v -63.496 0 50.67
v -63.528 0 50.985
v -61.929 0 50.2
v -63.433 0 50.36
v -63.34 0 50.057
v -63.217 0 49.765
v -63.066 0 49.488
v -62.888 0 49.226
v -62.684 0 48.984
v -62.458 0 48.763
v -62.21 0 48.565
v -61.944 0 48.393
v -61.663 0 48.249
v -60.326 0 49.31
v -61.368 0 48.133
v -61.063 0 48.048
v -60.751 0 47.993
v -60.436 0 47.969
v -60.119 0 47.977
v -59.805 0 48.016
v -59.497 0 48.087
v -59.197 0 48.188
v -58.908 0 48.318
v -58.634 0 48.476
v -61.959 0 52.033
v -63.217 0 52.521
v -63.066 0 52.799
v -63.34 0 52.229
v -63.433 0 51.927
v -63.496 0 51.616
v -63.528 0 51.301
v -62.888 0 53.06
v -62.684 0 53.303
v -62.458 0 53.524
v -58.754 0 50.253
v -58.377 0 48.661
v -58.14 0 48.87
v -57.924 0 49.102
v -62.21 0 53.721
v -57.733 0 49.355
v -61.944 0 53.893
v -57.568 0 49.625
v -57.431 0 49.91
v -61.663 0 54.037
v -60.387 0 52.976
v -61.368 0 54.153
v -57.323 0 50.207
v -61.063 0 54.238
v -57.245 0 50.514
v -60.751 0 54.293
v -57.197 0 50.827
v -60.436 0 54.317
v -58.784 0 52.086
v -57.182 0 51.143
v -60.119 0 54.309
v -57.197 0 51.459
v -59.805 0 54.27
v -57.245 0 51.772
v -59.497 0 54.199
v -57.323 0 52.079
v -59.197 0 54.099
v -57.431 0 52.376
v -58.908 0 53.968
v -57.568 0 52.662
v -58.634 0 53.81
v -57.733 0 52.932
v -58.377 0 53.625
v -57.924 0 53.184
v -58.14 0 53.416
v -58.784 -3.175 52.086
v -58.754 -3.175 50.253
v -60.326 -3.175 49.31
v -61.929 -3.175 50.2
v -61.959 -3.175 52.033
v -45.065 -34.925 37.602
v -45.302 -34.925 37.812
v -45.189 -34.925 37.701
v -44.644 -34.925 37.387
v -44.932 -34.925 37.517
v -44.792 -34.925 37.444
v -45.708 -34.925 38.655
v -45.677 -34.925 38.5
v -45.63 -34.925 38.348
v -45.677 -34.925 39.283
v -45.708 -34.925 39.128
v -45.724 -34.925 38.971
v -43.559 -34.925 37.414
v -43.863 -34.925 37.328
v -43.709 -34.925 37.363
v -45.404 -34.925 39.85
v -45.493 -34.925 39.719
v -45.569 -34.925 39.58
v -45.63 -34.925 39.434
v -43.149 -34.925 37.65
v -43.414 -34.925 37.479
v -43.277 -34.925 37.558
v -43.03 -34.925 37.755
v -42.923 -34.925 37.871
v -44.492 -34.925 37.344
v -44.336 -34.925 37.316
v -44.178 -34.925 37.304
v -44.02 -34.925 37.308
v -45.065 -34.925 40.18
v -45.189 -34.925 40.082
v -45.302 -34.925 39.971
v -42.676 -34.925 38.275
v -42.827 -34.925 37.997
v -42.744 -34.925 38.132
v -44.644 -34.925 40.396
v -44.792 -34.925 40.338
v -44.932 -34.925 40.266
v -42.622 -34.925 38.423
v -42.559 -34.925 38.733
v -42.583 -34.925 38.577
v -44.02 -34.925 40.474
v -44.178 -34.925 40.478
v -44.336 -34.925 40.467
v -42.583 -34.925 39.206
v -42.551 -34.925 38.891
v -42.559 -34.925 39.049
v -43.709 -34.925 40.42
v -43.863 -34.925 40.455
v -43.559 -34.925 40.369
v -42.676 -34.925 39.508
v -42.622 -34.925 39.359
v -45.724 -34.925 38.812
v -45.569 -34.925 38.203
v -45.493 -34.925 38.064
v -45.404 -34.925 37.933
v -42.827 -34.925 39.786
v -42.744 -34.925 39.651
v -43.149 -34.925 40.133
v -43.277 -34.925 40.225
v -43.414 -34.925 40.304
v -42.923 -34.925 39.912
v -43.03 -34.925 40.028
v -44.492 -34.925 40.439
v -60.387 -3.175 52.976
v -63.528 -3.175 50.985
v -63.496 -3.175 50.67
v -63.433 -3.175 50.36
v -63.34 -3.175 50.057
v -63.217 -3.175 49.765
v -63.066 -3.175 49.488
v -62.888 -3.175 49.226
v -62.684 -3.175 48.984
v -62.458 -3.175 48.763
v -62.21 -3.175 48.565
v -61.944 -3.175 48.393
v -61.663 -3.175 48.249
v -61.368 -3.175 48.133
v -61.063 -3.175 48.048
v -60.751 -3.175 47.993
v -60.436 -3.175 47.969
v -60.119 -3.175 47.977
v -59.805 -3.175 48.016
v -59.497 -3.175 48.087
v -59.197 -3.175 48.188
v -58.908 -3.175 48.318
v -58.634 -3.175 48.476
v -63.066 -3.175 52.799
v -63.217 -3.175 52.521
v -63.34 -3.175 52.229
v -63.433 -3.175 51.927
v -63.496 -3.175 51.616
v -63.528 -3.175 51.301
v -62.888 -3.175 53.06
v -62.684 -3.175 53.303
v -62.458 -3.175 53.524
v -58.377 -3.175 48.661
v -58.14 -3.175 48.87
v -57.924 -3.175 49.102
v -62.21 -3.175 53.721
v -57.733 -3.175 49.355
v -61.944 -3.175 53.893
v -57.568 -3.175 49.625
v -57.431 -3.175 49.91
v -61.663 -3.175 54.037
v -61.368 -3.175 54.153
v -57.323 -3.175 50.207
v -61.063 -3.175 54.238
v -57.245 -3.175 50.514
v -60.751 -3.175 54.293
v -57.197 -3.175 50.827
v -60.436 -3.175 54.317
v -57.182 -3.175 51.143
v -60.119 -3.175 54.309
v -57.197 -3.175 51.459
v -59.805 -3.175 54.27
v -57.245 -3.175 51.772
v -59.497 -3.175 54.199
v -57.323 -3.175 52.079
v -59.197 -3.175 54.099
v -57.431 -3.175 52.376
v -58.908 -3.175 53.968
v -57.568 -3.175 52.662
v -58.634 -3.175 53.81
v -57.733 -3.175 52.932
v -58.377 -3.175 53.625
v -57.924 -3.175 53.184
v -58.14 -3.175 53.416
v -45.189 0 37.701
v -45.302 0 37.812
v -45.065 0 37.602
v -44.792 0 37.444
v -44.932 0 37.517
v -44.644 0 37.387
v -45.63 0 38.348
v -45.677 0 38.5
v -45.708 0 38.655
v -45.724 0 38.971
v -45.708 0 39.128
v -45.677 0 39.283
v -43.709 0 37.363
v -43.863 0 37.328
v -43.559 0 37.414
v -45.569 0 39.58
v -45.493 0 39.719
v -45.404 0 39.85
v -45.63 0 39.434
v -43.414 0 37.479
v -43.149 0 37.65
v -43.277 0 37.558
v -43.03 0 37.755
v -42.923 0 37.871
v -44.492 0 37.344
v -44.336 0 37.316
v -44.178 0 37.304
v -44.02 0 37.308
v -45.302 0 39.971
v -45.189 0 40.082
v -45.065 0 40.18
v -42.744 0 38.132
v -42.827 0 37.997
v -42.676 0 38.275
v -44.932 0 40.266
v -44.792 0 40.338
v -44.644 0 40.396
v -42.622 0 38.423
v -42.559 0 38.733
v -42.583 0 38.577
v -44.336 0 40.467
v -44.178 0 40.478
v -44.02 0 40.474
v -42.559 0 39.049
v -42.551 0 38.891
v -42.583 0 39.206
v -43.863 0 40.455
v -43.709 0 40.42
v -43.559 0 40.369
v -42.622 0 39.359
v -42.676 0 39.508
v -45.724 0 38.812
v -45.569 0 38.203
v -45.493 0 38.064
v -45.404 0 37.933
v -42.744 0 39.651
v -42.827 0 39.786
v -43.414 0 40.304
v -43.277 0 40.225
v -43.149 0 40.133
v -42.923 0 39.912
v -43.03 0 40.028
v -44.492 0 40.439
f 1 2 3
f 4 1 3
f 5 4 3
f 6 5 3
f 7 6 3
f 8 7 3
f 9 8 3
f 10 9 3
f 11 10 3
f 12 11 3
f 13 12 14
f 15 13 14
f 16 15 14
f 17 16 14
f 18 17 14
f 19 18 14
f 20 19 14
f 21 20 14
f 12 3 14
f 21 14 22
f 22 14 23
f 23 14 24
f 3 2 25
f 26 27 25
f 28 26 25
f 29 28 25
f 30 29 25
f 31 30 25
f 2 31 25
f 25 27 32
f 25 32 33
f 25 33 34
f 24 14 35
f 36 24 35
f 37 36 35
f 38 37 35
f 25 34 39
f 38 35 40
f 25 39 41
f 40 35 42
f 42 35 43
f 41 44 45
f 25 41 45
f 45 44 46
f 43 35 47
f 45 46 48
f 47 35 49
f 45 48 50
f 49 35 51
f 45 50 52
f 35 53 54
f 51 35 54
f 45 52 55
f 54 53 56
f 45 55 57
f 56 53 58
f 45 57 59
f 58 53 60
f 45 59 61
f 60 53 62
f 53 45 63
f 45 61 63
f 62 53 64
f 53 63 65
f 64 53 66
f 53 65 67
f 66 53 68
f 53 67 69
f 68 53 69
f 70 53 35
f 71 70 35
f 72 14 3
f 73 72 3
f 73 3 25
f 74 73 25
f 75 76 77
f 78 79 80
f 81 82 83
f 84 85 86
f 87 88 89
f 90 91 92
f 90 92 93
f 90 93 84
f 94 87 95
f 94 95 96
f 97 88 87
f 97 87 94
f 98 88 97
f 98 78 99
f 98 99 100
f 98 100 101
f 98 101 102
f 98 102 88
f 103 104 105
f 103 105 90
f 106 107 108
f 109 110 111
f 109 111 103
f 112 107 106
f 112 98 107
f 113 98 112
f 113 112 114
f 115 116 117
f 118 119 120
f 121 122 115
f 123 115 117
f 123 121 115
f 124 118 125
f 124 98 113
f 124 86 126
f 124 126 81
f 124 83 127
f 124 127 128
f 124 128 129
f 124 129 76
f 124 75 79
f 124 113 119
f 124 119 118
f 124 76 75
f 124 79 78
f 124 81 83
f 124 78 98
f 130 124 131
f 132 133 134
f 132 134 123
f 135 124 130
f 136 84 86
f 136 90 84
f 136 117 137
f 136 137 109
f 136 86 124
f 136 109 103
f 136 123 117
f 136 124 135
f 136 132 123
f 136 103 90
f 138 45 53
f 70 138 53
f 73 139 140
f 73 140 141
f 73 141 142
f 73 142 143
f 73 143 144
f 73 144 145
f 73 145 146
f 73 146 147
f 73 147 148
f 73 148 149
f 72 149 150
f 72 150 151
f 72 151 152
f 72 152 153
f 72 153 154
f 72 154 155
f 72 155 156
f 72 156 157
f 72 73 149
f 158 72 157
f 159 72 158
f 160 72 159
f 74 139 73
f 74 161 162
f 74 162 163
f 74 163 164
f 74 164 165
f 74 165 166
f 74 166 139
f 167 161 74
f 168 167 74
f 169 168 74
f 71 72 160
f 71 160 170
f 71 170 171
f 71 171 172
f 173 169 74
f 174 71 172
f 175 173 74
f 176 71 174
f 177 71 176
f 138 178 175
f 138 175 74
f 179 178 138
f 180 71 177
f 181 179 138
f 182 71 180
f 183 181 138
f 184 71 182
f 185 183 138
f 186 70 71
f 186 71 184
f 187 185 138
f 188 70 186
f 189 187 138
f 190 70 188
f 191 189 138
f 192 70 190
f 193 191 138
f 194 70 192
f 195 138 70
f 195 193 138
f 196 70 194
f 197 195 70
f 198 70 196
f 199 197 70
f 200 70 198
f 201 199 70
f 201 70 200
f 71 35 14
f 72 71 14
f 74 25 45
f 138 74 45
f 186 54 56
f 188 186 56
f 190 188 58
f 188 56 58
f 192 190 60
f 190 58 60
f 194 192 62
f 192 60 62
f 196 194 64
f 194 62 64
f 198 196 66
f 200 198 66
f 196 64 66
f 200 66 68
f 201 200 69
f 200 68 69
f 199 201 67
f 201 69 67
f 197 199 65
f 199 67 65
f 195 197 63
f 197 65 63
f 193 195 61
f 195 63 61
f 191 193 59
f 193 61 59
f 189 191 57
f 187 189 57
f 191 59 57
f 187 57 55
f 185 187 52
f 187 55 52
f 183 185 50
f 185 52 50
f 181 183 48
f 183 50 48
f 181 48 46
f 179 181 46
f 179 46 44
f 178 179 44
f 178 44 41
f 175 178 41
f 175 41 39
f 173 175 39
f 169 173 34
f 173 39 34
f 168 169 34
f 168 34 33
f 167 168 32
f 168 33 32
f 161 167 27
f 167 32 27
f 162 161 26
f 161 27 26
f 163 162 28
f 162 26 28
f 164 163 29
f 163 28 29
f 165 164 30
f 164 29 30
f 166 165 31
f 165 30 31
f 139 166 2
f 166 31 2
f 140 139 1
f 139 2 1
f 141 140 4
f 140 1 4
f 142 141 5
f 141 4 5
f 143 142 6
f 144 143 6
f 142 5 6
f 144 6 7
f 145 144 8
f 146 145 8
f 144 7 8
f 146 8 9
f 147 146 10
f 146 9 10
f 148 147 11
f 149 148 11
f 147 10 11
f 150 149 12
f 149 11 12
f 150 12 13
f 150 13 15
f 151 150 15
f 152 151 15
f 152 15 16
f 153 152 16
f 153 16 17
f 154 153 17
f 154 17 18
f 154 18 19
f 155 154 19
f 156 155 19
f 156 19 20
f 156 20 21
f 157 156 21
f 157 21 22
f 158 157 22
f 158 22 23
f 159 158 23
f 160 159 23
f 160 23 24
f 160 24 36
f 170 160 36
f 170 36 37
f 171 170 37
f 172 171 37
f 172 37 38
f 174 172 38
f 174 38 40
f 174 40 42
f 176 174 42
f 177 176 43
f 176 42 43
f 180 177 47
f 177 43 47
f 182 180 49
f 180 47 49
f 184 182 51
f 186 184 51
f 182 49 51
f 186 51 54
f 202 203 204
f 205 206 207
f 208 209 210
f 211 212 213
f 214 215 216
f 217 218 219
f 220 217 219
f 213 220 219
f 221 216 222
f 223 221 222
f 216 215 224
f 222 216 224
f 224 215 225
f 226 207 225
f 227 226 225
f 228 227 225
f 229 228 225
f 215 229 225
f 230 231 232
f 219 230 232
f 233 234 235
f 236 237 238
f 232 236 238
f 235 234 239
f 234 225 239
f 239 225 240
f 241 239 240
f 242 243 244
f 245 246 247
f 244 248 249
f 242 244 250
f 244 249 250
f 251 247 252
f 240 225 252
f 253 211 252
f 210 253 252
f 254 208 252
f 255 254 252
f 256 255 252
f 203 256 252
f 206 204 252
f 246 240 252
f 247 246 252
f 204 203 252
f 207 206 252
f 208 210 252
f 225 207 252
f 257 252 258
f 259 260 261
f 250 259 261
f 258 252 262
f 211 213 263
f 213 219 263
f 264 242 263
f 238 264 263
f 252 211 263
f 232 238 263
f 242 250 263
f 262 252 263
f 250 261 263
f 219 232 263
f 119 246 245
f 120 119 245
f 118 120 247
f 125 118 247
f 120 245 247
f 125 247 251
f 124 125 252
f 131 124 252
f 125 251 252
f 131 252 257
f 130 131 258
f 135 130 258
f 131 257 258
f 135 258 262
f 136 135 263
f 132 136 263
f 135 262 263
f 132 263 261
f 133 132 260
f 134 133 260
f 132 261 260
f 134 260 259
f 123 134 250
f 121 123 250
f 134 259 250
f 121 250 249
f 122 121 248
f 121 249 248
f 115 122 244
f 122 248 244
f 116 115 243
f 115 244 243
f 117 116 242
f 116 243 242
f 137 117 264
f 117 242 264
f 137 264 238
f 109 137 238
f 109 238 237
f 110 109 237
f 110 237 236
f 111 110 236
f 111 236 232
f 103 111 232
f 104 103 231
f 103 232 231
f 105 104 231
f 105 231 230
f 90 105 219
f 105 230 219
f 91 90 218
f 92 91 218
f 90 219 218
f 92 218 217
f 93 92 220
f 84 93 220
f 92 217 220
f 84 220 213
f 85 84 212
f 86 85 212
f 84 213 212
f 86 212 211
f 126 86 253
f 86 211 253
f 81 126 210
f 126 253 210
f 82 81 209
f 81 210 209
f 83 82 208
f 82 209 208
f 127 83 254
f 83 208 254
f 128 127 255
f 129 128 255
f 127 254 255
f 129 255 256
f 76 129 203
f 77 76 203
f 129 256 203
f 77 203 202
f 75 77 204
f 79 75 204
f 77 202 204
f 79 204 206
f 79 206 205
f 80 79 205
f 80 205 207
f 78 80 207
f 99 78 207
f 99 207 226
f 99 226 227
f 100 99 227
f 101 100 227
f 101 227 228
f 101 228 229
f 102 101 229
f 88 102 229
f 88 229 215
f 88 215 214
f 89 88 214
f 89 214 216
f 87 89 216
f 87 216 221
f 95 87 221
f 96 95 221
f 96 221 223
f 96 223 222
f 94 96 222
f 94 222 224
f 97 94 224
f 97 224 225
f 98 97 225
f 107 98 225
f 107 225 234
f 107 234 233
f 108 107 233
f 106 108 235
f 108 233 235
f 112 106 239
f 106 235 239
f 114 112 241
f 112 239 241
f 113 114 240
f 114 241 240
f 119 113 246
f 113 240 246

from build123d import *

# Parameters (mm, degrees)
F0_R     = 3.175
F1_DEPTH = 3.175
F2_R     = 1.5875
F3_DEPTH = 34.925


with BuildPart() as f1:
    # F0 (on Front) → F1 (new body)
    with BuildSketch(Plane.XZ):
        with Locations((-60.356679, 51.143057)):
            Circle(F0_R)
        Polygon((-61.959338, 52.033345), (-60.386997, 52.976144), (-58.784338, 52.085857), (-58.75402, 50.25277), (-60.326361, 49.30997), (-61.92902, 50.200258), align=None, mode=Mode.SUBTRACT)
    extrude(amount=F1_DEPTH)


with BuildPart() as f3:
    # F2 (on Front) → F3 (new body)
    with BuildSketch(Plane.XZ):
        with Locations((-44.138659, 38.891412)):
            Circle(F2_R)
    extrude(amount=F3_DEPTH)


solid = Compound([f1.part, f3.part])
